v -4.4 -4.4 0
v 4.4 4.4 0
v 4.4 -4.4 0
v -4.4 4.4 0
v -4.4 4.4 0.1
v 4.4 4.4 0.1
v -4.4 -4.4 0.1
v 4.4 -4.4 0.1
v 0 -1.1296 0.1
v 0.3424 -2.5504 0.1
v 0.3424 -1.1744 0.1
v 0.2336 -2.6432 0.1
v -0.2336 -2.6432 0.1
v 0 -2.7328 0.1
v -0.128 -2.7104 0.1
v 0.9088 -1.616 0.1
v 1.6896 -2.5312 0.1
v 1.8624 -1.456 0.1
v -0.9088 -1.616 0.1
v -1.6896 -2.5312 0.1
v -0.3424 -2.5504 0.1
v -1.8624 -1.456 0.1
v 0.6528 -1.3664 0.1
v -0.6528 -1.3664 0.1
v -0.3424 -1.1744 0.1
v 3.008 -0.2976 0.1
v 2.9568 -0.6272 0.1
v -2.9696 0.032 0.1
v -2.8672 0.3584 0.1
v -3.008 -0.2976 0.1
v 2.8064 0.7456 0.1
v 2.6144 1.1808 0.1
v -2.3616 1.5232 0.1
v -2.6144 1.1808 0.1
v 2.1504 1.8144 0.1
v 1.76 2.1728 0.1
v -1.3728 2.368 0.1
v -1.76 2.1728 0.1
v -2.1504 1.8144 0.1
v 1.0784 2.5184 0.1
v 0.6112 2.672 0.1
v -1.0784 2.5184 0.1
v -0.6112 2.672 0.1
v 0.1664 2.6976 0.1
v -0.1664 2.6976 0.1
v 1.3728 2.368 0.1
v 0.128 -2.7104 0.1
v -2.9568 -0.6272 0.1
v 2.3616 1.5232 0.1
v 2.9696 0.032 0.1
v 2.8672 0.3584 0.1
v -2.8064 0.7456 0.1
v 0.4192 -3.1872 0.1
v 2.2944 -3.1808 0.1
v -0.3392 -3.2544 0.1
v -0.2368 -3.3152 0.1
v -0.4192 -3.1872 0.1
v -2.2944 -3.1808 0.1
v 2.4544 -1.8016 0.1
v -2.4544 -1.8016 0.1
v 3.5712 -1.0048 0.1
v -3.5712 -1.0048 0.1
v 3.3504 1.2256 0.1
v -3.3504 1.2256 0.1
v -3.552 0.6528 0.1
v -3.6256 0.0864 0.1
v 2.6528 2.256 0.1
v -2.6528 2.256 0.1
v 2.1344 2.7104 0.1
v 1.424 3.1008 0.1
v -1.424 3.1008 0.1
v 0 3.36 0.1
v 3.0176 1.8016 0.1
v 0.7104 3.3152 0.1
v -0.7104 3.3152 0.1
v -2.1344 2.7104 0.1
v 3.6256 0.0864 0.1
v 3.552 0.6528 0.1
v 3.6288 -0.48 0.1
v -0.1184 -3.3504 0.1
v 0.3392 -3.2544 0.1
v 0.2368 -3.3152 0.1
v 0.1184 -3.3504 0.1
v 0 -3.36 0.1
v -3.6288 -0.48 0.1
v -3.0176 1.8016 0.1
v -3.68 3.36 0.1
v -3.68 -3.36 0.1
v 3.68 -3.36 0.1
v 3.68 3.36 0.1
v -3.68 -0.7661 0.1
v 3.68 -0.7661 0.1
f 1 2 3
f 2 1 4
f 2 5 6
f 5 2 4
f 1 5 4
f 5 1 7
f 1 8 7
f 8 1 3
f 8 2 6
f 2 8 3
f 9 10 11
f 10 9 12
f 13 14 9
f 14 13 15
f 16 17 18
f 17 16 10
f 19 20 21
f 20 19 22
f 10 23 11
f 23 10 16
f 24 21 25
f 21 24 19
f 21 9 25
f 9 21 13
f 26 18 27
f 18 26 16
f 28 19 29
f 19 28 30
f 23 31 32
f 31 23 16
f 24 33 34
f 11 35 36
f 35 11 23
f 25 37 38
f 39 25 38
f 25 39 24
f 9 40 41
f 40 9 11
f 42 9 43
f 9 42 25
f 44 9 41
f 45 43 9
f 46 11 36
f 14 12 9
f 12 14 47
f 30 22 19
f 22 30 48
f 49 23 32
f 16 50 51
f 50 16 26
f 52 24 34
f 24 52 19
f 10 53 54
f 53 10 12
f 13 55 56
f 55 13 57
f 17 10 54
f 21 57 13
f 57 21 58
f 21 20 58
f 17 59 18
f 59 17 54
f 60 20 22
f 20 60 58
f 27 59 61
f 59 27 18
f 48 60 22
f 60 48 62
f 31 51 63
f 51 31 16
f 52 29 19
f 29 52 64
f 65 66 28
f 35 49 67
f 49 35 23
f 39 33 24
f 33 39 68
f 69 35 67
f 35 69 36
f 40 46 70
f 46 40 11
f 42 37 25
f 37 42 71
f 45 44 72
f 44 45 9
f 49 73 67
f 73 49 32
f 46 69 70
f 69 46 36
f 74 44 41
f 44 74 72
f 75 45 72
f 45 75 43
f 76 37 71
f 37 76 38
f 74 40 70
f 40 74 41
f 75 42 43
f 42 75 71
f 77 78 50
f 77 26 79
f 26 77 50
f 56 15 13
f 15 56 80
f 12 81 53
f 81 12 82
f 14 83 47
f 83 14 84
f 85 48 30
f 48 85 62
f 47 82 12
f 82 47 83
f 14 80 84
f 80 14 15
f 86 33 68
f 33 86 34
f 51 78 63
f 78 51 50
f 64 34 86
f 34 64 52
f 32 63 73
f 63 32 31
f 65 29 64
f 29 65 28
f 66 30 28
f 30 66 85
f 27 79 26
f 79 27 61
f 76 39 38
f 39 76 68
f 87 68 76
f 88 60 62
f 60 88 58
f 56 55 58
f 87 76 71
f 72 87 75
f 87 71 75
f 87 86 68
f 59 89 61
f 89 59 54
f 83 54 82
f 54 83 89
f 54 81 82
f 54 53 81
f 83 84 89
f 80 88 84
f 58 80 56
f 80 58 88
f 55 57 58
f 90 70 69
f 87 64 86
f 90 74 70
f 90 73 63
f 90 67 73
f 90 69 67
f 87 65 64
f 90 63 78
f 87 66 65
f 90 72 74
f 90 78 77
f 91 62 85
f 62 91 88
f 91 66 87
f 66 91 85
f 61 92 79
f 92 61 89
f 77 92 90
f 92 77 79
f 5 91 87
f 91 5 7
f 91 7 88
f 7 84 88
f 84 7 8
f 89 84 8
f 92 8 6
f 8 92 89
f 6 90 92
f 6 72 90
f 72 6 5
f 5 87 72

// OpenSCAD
// file: ../p/box5-12.scad
use <../lib.scad>
function ldraw_lib__box5_12() = [
// 0 Box with 5 Faces without Any Edges
// 0 Name: box5-12.dat
// 0 Author: Chris Dee [cwdee]
// 0 !LDRAW_ORG Primitive UPDATE 2009-02
// 0 !LICENSE Licensed under CC BY 4.0 : see CAreadme.txt
// 
// 0 BFC CERTIFY CCW
  [0,"BFC","CERTIFY"],
  [0,"BFC","CCW"],
// 
// 0 !HISTORY 2009-09-03 [PTadmin] Official Update 2009-02
// 
// 
// 4 16 1 1 1 1 1 -1 -1 1 -1 -1 1 1
  [4,16,1,1,1,1,1,-1,-1,1,-1,-1,1,1],
// 4 16 -1 0 1 1 0 1 1 1 1 -1 1 1
  [4,16,-1,0,1,1,0,1,1,1,1,-1,1,1],
// 4 16 -1 0 -1 -1 0 1 -1 1 1 -1 1 -1
  [4,16,-1,0,-1,-1,0,1,-1,1,1,-1,1,-1],
// 4 16 1 0 -1 -1 0 -1 -1 1 -1 1 1 -1
  [4,16,1,0,-1,-1,0,-1,-1,1,-1,1,1,-1],
// 4 16 1 0 1 1 0 -1 1 1 -1 1 1 1
  [4,16,1,0,1,1,0,-1,1,1,-1,1,1,1],
// 0
];
module ldraw_lib__box5_12(step=0, col=false, unit=2/5, alt=false, line=0.2, solid=!$preview)
    makepoly(ldraw_lib__box5_12(), step=step, col=col, unit=unit, alt=alt, line=line, solid=solid);
ldraw_lib__box5_12(line=0.2);
// main file
use <../lib.scad>
use <../p/box5-12.scad>
use <s/3004s60.scad>
function ldraw_lib__004462e() = [
// 0 Sticker  1.1 x  1.1 with Shell Logo 1971
// 0 Name: 004462e.dat
// 0 Author: Vincent Messenet [Cheenzo]
// 0 !LDRAW_ORG Part UPDATE 2022-05
// 0 !LICENSE Licensed under CC BY 4.0 : see CAreadme.txt
// 
// 0 BFC CERTIFY CCW
  [0,"BFC","CERTIFY"],
  [0,"BFC","CCW"],
// 
// 0 !KEYWORDS Set 392
// 
// 0 !HISTORY 2022-09-15 [PTadmin] Official Update 2022-05
// 
// 
// 1 16 0 -0.25 0 11 0 0 0 0.25 0 0 0 11 box5-12.dat
  [1,16,0,-0.25,0,11,0,0,0,0.25,0,0,0,11, ldraw_lib__box5_12()],
// 1 15 0 -0.25 0 0.8 0 0 0 0 1 0 -0.8 0 s\3004s60.dat
  [1,15,0,-0.25,0,0.8,0,0,0,0,1,0,-0.8,0, ldraw_lib__s__3004s60()],
// 
// 4 15 -9.2 -.25 -1.9152 -9.2 -.25 8.4 -11 -.25 11 -11 -.25 -11
  [4,15,-9.2,-.25,-1.9152,-9.2,-.25,8.4,-11,-.25,11,-11,-.25,-11],
// 3 15 -9.2 -.25 -1.9152 -11 -.25 -11 -9.2 -.25 -8.4
  [3,15,-9.2,-.25,-1.9152,-11,-.25,-11,-9.2,-.25,-8.4],
// 4 15 0 -.25 -8.4 -9.2 -.25 -8.4 -11 -.25 -11 11 -.25 -11
  [4,15,0,-.25,-8.4,-9.2,-.25,-8.4,-11,-.25,-11,11,-.25,-11],
// 3 15 9.2 -.25 -8.4 0 -.25 -8.4 11 -.25 -11
  [3,15,9.2,-.25,-8.4,0,-.25,-8.4,11,-.25,-11],
// 4 15 9.2 -.25 -1.9152 9.2 -.25 -8.4 11 -.25 -11 11 -.25 11
  [4,15,9.2,-.25,-1.9152,9.2,-.25,-8.4,11,-.25,-11,11,-.25,11],
// 3 15 11 -.25 11 9.2 -.25 8.4 9.2 -.25 -1.9152
  [3,15,11,-.25,11,9.2,-.25,8.4,9.2,-.25,-1.9152],
// 4 15 0 -.25 8.4 9.2 -.25 8.4 11 -.25 11 -11 -.25 11
  [4,15,0,-.25,8.4,9.2,-.25,8.4,11,-.25,11,-11,-.25,11],
// 3 15 -11 -.25 11 -9.2 -.25 8.4 0 -.25 8.4
  [3,15,-11,-.25,11,-9.2,-.25,8.4,0,-.25,8.4],
];
module ldraw_lib__004462e(step=0, col=false, unit=2/5, alt=false, line=0.2, solid=!$preview)
    makepoly(ldraw_lib__004462e(), step=step, col=col, unit=unit, alt=alt, line=line, solid=solid);
ldraw_lib__004462e(line=0.2);
